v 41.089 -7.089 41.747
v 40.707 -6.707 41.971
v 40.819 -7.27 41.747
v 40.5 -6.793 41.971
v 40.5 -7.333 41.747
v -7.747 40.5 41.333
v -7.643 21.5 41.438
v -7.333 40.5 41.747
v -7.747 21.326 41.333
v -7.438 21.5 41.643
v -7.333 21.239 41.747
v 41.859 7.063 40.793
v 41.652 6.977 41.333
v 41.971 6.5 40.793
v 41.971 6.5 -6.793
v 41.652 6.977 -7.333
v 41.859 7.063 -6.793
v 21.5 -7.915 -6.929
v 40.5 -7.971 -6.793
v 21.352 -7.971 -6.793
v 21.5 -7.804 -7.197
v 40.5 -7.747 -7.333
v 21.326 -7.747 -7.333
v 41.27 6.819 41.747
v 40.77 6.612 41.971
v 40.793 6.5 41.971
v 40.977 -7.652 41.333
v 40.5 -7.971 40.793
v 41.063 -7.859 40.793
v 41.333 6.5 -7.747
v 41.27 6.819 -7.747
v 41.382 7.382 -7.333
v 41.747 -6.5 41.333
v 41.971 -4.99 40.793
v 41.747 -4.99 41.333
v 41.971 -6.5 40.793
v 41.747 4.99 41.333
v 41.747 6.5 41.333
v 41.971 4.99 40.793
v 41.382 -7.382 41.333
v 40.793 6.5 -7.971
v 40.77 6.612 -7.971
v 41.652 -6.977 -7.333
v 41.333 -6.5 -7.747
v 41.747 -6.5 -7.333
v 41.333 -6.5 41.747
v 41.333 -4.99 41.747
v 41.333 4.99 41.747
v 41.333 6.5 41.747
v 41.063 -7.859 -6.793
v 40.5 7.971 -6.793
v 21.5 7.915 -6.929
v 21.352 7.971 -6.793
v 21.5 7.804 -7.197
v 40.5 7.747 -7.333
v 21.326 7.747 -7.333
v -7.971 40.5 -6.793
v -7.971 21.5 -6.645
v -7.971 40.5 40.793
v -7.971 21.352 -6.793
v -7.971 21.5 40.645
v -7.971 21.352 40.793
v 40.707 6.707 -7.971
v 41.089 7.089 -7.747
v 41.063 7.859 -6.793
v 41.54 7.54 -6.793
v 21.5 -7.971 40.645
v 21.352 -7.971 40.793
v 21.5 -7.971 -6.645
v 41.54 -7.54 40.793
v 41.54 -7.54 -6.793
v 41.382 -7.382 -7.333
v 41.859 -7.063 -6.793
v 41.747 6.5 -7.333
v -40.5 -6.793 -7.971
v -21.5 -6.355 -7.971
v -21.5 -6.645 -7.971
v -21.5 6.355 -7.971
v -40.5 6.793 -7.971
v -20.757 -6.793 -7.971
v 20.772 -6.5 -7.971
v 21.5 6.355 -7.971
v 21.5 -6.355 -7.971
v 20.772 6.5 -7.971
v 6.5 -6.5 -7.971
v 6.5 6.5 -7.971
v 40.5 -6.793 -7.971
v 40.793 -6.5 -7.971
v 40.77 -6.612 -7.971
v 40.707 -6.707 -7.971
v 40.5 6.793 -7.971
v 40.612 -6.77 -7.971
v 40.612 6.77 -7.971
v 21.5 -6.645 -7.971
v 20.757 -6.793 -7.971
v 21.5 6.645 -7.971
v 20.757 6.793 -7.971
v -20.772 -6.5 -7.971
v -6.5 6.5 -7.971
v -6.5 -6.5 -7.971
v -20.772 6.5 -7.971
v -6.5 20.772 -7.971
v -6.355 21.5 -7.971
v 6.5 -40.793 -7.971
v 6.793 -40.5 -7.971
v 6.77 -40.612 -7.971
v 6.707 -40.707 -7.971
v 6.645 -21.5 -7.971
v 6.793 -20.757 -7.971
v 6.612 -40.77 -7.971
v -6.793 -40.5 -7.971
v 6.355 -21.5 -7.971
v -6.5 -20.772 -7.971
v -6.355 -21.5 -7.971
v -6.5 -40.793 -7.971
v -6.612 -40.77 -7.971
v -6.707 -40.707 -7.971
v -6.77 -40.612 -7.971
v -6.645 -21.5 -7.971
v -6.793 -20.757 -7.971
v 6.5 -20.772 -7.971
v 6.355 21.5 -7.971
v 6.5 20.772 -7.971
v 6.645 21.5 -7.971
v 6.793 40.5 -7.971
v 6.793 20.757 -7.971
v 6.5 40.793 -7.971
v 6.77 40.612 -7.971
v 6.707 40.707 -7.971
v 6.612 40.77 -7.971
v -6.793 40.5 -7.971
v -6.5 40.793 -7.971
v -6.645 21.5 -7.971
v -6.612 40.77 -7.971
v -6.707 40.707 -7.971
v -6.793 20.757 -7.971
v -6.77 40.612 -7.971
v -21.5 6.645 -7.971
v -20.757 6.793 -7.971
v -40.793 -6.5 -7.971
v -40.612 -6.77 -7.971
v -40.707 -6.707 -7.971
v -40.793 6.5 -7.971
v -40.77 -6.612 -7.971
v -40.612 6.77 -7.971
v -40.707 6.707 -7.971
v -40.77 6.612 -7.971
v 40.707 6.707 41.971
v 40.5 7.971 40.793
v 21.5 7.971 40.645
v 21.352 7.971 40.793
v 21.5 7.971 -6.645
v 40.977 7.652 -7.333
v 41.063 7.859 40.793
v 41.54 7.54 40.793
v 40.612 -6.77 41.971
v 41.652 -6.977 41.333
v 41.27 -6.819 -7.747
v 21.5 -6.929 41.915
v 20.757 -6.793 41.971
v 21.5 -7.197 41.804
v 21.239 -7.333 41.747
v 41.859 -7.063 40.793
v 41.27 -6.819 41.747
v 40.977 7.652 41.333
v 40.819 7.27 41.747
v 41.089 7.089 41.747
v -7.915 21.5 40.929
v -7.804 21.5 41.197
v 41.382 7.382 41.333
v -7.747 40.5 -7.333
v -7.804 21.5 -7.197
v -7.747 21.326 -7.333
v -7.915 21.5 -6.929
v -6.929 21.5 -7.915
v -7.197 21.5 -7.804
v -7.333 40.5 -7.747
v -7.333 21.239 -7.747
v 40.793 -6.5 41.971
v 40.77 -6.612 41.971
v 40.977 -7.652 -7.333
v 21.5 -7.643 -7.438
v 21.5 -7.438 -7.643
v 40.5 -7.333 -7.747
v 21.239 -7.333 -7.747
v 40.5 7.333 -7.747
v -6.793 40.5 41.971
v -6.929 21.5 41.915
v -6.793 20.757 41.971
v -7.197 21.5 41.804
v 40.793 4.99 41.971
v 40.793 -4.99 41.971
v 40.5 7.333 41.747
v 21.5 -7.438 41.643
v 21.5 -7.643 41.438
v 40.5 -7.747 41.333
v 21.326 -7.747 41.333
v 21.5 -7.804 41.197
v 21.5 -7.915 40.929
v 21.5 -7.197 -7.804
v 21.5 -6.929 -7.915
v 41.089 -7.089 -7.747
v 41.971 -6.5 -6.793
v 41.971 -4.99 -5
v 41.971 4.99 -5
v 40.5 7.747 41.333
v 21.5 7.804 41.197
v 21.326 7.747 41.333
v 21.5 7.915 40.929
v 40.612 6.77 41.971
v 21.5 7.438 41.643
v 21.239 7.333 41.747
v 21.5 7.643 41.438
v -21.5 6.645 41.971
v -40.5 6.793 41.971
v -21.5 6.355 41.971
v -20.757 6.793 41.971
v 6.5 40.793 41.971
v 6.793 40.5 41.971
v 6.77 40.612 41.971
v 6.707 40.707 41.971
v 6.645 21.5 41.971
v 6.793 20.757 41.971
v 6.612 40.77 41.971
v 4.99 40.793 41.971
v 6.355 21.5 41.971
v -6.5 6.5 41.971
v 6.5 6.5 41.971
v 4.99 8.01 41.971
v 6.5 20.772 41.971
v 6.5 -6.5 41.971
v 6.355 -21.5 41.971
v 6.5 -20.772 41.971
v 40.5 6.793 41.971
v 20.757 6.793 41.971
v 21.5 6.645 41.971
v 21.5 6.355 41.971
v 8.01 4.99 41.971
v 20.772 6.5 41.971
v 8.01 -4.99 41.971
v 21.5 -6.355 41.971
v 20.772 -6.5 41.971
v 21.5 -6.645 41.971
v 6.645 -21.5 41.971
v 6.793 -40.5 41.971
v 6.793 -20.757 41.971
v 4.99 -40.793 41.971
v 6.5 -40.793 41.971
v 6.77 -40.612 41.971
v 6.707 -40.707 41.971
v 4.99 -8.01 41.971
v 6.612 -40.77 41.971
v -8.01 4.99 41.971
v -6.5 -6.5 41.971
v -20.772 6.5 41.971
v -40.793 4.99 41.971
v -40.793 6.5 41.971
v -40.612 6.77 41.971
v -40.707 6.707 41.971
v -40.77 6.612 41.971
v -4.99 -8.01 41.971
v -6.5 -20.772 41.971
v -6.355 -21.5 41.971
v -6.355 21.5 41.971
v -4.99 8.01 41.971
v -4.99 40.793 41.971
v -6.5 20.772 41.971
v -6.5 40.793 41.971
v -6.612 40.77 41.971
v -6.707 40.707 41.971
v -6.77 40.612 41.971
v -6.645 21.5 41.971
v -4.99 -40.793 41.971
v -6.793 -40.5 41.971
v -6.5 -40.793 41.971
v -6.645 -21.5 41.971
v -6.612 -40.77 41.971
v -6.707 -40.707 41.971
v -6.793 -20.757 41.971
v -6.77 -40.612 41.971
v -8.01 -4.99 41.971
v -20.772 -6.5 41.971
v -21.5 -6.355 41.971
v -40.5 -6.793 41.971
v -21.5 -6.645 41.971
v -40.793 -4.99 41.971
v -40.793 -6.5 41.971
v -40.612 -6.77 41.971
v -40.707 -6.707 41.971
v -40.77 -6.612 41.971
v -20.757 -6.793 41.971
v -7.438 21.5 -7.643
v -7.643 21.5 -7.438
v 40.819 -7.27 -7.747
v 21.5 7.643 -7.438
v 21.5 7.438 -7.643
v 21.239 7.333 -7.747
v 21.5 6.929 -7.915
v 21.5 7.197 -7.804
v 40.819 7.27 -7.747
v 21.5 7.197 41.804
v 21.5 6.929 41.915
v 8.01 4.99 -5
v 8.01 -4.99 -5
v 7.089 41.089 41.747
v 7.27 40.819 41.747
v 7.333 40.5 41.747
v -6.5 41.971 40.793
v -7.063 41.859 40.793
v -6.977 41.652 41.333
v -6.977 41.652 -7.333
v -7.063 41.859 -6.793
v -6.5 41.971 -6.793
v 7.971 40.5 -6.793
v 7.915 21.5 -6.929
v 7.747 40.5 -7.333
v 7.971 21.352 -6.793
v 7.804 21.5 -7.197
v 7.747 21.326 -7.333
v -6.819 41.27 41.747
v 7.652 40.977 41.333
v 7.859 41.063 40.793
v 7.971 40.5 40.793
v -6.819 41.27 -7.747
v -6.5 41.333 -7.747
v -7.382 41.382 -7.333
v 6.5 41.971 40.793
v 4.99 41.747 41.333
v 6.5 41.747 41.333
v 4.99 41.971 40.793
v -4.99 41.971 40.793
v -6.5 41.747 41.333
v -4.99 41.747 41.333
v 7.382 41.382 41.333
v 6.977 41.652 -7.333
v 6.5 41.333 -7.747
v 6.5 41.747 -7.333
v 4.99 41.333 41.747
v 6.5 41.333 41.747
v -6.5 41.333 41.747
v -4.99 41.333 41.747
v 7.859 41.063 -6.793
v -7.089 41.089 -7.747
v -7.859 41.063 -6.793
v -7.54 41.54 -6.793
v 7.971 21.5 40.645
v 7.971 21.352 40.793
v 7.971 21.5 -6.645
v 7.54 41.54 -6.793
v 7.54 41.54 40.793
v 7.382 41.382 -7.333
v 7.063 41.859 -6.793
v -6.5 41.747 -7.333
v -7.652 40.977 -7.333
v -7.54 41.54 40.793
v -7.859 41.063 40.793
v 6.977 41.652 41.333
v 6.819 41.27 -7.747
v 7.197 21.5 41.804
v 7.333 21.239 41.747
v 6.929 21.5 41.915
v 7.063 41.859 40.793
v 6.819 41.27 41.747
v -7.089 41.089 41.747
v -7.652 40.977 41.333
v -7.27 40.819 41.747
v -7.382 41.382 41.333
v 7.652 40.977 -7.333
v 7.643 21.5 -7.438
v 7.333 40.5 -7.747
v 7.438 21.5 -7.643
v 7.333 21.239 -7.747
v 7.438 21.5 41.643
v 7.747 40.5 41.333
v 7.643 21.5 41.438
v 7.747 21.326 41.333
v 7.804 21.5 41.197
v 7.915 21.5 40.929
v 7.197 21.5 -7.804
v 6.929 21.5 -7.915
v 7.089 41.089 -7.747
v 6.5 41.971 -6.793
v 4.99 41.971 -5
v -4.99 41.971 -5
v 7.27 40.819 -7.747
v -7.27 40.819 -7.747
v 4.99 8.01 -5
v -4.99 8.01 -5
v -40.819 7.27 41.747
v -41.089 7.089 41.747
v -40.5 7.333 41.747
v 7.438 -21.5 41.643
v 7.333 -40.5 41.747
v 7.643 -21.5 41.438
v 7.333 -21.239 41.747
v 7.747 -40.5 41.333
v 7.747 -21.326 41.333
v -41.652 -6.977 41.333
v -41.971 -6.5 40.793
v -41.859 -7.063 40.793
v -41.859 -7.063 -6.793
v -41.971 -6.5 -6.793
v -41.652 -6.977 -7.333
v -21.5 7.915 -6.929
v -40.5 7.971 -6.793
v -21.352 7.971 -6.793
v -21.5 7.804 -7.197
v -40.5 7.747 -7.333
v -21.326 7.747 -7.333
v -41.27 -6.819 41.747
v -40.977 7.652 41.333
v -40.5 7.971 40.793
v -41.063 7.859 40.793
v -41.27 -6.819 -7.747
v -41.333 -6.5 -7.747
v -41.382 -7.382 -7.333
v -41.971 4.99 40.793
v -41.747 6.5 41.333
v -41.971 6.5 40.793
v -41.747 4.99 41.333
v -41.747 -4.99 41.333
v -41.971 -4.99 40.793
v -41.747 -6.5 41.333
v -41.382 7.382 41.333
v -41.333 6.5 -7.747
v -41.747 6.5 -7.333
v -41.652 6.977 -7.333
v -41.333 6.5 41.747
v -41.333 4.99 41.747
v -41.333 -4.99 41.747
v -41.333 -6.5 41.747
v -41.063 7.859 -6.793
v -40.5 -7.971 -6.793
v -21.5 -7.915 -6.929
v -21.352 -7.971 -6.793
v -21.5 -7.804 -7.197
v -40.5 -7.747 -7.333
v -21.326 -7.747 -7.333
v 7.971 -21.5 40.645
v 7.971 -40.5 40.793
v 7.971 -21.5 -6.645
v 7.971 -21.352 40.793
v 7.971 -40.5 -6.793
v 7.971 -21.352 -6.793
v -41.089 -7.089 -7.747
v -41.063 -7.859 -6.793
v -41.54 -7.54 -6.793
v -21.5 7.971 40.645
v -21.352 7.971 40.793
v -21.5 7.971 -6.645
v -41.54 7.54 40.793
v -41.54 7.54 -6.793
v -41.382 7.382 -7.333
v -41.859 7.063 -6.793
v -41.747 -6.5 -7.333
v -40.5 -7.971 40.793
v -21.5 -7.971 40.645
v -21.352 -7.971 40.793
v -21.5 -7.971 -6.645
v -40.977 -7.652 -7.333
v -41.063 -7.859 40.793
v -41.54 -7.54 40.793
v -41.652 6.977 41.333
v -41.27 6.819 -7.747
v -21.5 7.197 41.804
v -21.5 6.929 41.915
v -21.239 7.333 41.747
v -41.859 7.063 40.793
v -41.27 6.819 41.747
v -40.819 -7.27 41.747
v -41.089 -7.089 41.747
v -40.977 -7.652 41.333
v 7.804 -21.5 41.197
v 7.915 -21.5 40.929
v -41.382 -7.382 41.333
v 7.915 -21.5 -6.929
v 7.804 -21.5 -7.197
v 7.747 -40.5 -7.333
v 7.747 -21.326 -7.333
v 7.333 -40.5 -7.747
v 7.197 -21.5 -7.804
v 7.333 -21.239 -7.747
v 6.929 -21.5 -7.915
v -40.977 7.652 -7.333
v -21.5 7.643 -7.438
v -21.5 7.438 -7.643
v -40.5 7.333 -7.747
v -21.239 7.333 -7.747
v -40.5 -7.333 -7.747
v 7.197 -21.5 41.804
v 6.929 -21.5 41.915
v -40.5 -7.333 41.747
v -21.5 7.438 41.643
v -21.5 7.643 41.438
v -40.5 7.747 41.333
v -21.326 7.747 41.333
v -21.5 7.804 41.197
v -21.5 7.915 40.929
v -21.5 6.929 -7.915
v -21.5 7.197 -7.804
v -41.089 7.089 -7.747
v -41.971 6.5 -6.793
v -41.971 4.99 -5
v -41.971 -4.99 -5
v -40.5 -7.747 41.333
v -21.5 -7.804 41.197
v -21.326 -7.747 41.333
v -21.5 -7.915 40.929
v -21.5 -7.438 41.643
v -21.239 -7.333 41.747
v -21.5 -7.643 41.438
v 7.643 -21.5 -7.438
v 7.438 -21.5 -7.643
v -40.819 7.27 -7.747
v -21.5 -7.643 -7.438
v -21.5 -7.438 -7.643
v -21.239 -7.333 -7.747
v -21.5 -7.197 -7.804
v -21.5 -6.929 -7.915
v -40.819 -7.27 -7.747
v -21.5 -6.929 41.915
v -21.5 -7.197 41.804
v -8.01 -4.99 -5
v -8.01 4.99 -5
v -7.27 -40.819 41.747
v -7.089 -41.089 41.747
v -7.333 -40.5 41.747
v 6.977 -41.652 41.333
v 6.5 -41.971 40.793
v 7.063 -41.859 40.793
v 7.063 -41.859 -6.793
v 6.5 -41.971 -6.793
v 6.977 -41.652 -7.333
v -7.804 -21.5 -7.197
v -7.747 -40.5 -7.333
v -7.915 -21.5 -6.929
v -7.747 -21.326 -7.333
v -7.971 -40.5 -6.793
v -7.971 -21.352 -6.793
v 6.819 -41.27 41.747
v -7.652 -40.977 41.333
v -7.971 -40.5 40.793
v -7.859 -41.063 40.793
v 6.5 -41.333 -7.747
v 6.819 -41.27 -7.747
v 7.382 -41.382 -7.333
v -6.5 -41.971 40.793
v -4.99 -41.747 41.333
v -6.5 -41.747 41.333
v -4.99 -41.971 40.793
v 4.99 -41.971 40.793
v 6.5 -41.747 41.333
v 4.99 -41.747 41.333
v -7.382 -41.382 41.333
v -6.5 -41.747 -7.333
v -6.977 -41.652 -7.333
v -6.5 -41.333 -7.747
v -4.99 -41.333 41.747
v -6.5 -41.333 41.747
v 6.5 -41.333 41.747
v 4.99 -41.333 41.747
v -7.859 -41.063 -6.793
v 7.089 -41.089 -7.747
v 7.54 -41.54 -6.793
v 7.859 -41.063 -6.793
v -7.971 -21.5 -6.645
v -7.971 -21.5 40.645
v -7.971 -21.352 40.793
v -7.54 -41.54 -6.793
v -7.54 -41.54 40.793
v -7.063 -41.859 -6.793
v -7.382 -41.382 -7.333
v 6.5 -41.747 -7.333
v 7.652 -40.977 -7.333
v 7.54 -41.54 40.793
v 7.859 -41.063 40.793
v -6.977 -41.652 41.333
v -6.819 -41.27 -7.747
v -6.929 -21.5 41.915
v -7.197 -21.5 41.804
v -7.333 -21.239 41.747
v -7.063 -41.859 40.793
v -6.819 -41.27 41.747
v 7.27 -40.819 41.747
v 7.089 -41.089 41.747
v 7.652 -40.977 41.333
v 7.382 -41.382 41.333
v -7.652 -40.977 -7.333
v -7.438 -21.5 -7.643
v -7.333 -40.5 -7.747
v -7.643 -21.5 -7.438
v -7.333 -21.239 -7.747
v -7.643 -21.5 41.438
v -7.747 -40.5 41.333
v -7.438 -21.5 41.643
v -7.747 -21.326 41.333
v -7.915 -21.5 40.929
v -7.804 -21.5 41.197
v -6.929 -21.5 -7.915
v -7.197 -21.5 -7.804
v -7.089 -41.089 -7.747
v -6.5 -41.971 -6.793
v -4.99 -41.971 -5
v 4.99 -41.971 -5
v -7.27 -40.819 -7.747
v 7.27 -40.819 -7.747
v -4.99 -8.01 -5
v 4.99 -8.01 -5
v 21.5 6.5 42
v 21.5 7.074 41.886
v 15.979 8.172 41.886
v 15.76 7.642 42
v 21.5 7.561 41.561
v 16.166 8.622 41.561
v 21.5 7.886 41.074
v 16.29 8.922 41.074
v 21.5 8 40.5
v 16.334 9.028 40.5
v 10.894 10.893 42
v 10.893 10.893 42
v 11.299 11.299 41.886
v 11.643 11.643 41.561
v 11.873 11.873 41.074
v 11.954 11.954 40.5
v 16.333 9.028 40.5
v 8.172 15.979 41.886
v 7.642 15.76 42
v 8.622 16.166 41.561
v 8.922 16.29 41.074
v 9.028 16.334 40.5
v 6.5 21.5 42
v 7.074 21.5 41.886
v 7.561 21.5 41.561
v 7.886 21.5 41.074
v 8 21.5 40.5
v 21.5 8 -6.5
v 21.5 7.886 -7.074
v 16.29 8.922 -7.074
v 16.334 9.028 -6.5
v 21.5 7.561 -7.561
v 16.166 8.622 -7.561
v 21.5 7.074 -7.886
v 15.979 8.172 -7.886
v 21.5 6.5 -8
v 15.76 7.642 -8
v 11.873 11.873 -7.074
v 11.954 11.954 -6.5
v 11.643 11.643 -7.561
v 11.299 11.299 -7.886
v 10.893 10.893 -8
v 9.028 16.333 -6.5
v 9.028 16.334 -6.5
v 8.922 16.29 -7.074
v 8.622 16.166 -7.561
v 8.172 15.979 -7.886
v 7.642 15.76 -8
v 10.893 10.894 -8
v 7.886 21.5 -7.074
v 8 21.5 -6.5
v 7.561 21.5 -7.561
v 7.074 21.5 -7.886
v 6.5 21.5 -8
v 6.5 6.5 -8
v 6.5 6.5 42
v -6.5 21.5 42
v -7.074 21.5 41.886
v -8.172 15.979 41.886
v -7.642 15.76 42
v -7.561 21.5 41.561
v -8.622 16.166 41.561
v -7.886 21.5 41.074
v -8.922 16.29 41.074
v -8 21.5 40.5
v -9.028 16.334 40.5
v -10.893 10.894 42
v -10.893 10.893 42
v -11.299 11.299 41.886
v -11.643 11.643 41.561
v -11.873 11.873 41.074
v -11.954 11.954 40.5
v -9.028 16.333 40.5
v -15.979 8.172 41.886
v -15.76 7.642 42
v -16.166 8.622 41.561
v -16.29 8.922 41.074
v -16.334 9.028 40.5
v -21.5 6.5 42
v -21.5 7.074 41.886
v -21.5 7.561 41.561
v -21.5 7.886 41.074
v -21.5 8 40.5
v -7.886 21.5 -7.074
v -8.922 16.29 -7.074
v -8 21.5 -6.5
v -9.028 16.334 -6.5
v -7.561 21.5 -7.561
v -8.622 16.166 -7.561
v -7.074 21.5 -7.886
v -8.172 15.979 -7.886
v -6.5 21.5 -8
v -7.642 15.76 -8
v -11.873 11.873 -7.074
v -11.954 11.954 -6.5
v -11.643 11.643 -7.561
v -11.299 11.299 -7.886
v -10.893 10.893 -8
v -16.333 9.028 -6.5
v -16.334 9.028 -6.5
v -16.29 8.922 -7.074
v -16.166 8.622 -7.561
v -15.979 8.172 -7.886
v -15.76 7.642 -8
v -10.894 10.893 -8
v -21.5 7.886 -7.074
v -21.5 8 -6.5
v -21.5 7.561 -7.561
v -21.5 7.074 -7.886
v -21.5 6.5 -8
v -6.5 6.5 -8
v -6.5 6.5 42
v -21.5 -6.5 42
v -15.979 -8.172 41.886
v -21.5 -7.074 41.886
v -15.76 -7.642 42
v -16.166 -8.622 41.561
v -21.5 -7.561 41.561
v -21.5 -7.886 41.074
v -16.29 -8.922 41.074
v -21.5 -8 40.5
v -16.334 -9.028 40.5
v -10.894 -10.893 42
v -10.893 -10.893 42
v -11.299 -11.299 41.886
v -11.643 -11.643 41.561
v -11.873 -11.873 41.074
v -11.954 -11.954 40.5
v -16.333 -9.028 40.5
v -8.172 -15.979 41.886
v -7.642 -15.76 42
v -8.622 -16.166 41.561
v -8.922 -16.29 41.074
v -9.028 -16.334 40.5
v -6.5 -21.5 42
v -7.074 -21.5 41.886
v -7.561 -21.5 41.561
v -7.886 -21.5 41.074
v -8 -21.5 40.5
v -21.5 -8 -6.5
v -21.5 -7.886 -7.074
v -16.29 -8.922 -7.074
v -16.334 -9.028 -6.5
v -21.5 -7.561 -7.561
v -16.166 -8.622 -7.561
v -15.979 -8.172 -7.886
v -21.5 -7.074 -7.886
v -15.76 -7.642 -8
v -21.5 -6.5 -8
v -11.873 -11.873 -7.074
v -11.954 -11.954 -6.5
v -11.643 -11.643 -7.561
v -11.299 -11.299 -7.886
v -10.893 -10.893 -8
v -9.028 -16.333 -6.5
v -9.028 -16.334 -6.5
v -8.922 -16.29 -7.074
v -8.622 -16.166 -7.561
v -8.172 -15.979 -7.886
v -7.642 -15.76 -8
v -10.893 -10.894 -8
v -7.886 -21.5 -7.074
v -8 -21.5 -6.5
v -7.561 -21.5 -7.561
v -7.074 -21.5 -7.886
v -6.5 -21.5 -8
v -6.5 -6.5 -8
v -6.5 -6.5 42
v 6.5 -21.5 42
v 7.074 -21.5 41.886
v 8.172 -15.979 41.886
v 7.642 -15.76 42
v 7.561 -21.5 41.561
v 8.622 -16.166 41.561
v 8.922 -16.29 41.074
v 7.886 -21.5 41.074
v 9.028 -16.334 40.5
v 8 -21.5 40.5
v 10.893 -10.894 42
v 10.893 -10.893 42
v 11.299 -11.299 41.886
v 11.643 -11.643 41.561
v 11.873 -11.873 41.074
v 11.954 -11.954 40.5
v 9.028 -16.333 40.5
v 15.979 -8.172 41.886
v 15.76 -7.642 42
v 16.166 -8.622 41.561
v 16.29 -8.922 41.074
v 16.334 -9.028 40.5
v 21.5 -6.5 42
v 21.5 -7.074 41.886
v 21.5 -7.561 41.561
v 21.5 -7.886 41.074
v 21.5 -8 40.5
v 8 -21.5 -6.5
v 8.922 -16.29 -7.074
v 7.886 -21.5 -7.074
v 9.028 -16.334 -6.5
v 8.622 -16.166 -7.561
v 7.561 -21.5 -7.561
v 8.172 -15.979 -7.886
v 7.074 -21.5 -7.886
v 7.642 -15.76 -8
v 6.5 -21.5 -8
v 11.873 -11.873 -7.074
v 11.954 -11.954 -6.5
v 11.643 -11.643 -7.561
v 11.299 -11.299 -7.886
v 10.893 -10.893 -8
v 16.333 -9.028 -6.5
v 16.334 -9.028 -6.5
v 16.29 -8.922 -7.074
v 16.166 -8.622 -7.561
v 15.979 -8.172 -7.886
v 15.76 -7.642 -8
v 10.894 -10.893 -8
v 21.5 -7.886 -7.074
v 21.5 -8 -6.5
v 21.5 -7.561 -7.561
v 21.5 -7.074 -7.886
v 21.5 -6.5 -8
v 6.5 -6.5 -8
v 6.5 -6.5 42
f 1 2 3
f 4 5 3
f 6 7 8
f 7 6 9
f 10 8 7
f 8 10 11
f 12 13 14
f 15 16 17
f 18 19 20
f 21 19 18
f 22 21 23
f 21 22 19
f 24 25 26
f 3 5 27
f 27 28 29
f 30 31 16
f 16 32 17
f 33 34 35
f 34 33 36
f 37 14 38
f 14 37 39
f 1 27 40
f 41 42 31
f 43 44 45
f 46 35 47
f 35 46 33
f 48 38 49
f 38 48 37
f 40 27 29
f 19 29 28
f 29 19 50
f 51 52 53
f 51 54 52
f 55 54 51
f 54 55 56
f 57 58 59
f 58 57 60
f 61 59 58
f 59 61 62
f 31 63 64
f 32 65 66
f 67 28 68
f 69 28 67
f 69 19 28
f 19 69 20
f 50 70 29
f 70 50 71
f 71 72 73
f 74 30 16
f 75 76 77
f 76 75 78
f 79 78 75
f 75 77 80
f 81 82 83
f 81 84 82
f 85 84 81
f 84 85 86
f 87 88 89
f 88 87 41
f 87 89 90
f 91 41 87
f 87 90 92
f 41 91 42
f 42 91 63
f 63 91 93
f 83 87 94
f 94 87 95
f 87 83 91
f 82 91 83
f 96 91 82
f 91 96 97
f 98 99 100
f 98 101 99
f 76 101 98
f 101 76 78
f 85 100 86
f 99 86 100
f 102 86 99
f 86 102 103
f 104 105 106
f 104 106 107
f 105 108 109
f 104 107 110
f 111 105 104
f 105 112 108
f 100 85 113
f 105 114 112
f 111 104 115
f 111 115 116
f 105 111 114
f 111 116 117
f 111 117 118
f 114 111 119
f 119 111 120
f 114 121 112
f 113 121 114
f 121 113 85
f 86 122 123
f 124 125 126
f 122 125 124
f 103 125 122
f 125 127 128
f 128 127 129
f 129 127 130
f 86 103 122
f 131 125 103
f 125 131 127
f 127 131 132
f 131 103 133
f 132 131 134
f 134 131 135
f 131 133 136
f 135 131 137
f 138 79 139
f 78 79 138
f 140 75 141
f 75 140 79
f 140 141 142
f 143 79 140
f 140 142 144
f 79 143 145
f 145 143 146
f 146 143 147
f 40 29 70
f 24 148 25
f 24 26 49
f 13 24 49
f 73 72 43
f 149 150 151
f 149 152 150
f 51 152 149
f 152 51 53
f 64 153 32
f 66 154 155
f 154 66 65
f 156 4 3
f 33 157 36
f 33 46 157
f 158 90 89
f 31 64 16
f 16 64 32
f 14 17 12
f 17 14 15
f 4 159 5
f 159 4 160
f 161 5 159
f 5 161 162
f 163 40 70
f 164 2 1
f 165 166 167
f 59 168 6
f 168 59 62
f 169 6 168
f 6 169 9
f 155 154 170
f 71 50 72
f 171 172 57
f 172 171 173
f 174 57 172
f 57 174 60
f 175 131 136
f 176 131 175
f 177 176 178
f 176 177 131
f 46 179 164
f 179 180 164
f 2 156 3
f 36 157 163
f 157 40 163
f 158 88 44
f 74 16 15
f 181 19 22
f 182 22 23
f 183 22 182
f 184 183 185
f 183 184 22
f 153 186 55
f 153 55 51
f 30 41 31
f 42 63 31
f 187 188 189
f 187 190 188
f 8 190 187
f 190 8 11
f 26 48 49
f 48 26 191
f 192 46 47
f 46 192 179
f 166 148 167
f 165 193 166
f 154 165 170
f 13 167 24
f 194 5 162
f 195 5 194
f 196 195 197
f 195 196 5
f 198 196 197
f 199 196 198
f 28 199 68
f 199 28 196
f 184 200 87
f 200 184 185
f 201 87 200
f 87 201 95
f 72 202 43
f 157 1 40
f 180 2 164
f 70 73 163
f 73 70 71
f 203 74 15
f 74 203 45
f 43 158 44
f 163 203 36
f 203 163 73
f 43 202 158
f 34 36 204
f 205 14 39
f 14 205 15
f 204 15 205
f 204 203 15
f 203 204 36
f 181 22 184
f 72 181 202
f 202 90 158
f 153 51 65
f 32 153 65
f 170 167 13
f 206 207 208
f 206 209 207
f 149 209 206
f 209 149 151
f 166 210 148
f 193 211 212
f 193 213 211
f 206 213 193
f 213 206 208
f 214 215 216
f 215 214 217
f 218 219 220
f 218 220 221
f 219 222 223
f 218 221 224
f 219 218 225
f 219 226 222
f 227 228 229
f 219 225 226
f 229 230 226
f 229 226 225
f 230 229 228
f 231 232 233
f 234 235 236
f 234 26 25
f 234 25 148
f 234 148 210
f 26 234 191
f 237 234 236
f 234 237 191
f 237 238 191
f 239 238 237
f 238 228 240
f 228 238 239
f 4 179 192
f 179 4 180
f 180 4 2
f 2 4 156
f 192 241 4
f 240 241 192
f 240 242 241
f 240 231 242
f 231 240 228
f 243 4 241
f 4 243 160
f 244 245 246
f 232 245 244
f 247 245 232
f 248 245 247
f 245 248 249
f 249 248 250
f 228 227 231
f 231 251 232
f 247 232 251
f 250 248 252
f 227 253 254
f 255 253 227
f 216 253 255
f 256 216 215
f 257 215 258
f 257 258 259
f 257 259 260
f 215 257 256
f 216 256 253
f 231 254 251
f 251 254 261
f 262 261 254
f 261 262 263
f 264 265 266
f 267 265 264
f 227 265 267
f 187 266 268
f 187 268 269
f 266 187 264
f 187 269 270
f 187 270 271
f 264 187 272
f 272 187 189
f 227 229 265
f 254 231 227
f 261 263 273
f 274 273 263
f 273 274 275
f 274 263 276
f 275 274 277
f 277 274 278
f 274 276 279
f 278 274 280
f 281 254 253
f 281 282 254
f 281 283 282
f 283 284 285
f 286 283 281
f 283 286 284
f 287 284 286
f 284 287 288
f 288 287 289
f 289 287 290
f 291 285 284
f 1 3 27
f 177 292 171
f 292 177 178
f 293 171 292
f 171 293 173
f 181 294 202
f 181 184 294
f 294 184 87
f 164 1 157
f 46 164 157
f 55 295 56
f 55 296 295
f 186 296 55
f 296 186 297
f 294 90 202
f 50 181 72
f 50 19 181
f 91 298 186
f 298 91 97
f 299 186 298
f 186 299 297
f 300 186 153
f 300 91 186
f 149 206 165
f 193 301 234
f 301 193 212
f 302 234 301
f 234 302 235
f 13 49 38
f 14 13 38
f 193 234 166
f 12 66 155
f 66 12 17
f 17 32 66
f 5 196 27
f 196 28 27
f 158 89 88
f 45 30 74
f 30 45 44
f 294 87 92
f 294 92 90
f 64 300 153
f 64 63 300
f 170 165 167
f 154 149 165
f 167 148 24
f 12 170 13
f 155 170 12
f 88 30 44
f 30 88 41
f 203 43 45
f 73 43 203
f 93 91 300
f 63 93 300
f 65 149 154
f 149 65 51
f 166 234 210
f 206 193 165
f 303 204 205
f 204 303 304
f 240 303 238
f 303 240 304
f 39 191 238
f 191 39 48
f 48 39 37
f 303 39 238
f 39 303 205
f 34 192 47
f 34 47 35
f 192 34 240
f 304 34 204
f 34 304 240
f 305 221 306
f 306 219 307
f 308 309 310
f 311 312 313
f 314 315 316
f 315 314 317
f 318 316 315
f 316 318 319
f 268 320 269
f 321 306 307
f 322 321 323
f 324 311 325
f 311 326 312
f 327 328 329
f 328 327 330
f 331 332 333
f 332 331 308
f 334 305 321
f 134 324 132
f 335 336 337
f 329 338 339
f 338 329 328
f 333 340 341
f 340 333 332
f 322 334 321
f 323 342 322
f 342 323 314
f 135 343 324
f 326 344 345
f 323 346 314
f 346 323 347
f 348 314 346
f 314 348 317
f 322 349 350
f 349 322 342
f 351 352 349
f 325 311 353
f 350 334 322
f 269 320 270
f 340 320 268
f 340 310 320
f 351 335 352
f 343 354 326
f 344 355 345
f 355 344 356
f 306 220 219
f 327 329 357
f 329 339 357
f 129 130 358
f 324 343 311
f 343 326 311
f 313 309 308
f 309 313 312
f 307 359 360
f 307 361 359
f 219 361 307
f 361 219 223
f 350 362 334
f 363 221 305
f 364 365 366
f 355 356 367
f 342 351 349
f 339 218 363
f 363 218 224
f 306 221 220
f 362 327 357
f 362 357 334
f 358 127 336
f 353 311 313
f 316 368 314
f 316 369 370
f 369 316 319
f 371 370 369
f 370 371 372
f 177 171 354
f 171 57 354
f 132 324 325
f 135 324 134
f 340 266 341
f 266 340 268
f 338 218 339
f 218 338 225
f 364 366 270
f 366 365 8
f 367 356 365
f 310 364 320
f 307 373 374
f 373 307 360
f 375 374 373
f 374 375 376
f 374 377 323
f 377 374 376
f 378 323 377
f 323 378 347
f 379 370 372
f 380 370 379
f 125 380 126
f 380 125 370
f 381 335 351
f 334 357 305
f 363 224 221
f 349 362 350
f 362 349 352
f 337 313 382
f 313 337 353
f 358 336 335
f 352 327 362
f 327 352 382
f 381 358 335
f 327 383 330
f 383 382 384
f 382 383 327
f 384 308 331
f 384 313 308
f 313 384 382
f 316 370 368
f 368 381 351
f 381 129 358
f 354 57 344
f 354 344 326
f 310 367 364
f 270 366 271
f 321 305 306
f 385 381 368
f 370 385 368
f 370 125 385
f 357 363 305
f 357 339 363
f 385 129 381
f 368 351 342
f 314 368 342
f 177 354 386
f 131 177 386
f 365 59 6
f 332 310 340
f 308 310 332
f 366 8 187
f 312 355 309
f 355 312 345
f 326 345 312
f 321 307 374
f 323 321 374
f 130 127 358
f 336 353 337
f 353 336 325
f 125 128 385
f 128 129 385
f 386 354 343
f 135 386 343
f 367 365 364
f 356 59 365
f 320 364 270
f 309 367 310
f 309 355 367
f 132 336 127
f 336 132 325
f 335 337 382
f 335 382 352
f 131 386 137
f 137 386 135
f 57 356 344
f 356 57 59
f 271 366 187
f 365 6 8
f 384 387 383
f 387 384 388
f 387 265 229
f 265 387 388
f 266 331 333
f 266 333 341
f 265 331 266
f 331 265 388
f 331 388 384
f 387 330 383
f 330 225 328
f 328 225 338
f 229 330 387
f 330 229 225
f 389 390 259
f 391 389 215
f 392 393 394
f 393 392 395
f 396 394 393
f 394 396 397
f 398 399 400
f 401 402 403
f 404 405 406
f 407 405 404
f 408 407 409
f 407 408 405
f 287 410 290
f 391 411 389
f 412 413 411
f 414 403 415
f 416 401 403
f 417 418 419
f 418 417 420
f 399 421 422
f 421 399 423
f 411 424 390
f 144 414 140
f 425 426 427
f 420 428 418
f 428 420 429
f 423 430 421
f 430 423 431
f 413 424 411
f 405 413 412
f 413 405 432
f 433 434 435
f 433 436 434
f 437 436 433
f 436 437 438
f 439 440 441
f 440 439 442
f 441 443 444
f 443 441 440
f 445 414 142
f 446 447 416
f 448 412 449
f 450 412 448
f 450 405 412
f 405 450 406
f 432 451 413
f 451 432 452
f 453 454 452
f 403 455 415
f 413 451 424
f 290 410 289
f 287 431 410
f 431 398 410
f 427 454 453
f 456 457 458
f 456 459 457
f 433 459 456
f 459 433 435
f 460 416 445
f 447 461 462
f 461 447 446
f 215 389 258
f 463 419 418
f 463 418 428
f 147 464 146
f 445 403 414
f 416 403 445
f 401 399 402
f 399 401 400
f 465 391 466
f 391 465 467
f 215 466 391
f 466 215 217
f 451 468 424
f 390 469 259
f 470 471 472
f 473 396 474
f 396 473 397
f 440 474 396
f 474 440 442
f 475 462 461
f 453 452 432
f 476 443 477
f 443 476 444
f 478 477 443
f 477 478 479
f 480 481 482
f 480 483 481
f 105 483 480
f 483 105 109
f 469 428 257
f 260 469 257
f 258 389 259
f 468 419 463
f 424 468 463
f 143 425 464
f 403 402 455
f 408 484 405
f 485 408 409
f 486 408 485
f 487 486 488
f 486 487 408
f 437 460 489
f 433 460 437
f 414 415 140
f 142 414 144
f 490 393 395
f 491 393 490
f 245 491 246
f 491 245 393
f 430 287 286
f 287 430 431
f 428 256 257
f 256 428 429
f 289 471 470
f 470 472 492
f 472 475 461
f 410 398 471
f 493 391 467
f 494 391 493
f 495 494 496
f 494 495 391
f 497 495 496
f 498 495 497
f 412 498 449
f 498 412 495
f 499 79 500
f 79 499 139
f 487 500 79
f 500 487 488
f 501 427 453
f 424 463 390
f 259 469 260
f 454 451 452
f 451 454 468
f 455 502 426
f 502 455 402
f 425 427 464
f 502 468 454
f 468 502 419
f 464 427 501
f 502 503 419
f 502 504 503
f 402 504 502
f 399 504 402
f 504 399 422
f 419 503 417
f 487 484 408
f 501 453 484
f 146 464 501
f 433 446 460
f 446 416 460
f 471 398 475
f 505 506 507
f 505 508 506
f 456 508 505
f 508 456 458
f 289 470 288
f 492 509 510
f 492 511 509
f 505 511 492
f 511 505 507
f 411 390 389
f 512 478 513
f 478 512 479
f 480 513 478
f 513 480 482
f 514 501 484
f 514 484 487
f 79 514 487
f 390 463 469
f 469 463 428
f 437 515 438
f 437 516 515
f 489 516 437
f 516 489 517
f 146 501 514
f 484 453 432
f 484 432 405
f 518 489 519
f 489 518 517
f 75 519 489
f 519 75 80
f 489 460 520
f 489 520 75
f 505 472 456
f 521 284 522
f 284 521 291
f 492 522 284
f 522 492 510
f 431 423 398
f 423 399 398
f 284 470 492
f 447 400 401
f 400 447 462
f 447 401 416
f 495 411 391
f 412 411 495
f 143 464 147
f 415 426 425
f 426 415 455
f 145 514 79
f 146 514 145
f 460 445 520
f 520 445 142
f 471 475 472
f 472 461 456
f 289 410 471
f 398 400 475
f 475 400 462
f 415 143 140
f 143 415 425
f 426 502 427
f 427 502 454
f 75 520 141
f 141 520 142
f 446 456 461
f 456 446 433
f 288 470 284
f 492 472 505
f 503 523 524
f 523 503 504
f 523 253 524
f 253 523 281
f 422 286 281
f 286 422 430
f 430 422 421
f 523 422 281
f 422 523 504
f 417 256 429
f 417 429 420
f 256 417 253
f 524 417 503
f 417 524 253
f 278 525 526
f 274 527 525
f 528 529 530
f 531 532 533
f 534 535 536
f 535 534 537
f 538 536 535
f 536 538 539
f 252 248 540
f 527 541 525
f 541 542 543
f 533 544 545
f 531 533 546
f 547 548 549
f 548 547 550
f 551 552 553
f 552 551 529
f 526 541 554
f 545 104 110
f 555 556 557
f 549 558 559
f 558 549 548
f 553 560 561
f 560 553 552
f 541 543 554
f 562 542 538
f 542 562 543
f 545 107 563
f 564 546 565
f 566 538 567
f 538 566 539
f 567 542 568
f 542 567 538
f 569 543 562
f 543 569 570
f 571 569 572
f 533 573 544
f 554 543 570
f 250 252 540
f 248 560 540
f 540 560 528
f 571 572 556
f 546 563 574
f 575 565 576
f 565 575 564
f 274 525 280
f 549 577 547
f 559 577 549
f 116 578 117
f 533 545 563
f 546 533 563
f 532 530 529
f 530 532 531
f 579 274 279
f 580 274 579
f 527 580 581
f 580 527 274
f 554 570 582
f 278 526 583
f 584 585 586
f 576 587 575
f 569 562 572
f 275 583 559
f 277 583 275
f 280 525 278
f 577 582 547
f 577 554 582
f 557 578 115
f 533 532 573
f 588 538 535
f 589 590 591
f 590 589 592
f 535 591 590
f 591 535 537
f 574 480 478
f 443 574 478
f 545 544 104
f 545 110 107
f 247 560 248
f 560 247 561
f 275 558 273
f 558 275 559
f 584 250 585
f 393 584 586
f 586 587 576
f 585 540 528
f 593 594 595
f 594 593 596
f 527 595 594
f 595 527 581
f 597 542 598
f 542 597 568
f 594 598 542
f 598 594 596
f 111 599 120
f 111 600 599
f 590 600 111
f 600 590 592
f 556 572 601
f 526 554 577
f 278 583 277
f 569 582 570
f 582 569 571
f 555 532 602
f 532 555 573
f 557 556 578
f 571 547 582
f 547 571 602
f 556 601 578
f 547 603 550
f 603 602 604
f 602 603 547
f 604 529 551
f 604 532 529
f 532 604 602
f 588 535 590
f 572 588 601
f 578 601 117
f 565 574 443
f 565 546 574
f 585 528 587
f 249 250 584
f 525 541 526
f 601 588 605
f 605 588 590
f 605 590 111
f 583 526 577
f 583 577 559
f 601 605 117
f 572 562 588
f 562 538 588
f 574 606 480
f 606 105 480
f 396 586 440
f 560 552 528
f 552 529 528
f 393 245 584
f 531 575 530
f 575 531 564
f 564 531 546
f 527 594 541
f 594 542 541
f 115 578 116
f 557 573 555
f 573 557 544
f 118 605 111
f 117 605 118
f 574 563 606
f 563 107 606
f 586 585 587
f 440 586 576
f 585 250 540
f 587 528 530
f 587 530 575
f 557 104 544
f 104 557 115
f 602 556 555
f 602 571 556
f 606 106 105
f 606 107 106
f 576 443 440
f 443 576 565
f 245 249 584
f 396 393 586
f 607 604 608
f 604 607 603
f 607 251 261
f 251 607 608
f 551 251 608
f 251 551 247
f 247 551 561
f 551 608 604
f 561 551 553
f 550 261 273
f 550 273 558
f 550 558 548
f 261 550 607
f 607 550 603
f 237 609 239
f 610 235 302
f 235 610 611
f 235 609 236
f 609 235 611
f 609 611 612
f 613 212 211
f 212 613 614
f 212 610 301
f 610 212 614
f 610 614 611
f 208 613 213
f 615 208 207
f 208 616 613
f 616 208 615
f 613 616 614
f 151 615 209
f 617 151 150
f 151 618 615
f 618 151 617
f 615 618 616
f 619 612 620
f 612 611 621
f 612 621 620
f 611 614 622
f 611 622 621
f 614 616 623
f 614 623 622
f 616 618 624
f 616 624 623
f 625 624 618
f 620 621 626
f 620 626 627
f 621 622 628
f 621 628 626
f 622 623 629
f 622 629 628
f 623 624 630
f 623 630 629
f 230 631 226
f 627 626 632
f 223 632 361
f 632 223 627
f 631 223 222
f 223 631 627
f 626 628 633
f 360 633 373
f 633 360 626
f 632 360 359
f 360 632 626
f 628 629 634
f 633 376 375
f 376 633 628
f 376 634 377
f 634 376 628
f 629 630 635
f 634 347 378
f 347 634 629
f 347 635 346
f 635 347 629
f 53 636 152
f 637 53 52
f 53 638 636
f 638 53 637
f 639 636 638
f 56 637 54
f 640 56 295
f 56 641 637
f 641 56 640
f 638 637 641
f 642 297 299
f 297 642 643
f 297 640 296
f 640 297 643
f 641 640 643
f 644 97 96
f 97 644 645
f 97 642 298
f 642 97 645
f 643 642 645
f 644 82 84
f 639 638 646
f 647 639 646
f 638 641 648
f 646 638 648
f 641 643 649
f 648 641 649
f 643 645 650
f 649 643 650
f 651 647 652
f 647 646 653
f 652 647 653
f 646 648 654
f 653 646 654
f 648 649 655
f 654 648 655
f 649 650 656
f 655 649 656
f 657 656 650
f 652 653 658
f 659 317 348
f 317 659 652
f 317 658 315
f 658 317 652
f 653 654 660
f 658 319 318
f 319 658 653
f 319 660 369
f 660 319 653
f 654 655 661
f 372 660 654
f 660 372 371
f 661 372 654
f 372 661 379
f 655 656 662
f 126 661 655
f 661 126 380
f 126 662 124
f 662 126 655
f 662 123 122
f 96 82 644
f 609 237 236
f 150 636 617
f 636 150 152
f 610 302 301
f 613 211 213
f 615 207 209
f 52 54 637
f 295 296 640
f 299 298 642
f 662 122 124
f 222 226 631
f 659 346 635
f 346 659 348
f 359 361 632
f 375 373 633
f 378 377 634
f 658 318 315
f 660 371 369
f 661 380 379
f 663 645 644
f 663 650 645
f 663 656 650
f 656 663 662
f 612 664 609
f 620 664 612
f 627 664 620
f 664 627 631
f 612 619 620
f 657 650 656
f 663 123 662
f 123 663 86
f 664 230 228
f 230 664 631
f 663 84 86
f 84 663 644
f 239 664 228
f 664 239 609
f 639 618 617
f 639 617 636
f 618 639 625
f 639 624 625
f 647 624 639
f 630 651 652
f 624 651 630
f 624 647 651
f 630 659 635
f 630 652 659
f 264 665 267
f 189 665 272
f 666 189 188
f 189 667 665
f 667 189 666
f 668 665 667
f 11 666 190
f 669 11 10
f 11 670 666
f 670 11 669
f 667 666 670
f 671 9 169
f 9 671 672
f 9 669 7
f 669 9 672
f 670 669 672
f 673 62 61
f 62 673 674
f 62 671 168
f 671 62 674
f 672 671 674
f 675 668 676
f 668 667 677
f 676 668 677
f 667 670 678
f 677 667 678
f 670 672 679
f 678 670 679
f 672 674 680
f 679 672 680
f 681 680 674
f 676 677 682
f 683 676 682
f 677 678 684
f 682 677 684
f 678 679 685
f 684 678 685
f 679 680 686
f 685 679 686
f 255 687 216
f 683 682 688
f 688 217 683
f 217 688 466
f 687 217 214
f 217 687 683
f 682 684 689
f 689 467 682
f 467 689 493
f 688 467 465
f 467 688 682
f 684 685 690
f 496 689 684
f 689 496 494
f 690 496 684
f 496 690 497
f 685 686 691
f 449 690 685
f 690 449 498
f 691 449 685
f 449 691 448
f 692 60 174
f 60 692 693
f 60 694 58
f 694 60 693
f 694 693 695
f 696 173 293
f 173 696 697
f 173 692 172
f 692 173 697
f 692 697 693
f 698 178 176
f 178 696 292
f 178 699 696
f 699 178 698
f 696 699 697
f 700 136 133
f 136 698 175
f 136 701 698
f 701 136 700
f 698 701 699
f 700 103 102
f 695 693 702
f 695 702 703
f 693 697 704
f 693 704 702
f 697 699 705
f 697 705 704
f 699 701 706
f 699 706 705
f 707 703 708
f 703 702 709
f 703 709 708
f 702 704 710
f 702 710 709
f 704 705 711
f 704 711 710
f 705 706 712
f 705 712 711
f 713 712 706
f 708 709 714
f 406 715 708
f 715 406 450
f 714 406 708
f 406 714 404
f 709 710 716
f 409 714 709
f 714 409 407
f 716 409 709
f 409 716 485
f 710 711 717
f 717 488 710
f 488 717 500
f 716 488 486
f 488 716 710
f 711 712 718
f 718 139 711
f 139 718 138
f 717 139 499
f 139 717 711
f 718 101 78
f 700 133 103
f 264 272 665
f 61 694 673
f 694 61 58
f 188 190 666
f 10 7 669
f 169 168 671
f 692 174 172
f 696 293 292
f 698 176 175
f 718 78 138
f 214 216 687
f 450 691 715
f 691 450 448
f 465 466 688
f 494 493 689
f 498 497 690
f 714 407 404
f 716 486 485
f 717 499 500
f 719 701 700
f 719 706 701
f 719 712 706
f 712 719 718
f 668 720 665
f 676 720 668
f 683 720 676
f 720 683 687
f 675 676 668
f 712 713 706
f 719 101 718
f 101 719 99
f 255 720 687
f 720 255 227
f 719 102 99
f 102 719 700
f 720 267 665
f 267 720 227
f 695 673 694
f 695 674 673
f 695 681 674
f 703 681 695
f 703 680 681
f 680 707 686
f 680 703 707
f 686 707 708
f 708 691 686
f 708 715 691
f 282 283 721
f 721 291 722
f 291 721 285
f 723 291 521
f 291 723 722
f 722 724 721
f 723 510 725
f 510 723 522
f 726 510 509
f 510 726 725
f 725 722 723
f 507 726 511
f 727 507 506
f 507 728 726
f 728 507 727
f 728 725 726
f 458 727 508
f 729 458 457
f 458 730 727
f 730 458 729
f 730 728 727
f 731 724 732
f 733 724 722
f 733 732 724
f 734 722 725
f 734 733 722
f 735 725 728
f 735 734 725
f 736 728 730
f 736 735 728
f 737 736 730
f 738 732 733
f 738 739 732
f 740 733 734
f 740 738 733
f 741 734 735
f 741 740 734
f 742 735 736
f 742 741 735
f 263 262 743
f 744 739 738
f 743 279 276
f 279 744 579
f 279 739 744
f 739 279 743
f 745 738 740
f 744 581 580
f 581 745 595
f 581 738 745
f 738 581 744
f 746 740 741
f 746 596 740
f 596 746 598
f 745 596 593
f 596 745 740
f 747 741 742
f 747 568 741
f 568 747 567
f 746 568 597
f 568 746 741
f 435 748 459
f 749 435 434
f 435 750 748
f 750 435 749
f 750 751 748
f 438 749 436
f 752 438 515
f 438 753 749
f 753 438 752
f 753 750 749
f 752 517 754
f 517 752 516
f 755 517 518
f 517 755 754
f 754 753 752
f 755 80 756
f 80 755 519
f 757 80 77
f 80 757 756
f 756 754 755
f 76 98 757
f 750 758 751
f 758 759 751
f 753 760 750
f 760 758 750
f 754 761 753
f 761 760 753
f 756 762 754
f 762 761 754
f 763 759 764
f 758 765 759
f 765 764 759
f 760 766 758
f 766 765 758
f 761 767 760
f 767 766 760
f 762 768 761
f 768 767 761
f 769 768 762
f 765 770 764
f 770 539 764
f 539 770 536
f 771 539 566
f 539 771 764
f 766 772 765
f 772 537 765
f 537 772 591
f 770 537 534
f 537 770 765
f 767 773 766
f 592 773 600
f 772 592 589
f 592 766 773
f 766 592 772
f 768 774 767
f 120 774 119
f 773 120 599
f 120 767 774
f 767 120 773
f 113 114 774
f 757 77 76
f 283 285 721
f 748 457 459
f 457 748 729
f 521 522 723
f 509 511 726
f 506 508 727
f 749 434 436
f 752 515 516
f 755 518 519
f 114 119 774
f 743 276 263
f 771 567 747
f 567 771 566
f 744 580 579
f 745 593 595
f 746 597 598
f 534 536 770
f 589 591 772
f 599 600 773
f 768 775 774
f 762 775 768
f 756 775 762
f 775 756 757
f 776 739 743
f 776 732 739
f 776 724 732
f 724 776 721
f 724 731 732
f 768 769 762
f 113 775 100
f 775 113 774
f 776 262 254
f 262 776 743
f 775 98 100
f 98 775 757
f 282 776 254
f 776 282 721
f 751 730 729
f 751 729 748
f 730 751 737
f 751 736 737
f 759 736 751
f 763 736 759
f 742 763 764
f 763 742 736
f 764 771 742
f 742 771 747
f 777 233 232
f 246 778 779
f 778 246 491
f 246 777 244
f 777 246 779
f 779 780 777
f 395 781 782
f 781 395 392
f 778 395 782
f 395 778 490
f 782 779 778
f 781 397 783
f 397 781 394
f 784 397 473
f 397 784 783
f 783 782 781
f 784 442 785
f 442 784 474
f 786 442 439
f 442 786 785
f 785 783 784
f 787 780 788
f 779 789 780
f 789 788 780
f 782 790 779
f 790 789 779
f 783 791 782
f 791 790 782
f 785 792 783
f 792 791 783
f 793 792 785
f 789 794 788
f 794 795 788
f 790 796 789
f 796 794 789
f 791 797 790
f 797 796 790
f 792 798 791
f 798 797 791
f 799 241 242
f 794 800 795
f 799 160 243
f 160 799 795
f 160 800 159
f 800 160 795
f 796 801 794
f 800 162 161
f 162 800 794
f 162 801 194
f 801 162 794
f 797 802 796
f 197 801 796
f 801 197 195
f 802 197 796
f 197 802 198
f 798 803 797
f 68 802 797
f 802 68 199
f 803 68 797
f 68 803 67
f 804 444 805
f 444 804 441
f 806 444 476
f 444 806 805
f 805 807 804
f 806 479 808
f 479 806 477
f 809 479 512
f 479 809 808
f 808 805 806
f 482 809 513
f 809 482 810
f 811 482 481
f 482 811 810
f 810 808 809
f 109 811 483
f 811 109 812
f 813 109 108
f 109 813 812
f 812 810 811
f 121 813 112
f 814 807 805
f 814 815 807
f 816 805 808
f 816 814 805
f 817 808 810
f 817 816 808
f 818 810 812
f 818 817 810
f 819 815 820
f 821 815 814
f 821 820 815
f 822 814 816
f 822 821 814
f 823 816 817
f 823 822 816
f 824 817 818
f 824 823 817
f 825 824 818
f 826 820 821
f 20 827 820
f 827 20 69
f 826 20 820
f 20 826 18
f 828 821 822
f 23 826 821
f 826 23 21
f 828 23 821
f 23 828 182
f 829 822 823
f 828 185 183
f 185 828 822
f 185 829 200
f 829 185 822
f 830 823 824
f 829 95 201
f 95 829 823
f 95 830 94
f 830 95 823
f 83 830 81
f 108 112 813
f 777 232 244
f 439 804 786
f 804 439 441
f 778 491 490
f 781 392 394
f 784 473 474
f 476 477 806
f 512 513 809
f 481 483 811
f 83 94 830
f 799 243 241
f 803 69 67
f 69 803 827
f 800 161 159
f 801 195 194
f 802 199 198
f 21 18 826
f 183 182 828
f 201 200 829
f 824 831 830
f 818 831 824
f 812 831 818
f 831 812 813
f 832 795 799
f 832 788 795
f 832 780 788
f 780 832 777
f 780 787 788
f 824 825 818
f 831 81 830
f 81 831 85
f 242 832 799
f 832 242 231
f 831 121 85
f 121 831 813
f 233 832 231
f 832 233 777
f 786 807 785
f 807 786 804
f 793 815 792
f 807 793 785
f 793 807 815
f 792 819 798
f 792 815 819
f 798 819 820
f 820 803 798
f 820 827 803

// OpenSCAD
/* [Parameters] */

//
module_type = "X-module"; // [I-module, L-module, T-module, X-module, BL-module, BT-module, BR-module, FL-module, FT-module, FR-module]

//
module_width = 50;

//
board_thickness = 10;

//
wall_thickness = 3;

/* [Shape] */
//Open SCAD parameter $fn = 4*detalization. Do not put too big value customizer will stuck.
shape_detalization=4; // default = 15, i.e. $fn = 60

//
corner_radius = 15;

//corner shape type
shape_type = "no shape"; // [no shape, linear, circle, arc-in]

//
shape_parameter = 0;

HH = module_width;
RR = corner_radius;
DD = board_thickness;
r=wall_thickness/2;

PP = shape_parameter;
$fn = 4*shape_detalization;

module side_block(h,d,r) {
 LHH = h-d/2-3*r;
 LDD = d/2+r;
 eps=0.01;

 difference(){
  hull(){
   translate([-LDD,+LDD,-LDD])sphere(r=r,center=true);
   translate([-LDD,-LDD,-LDD])sphere(r=r,center=true);
   translate([LHH,+LDD,-LDD])sphere(r=r,center=true);
   translate([LHH,-LDD,-LDD])sphere(r=r,center=true);
   translate([-LDD,+LDD,LHH])sphere(r=r,center=true);
   translate([-LDD,-LDD,LHH])sphere(r=r,center=true);
   translate([LHH,+LDD,LHH])sphere(r=r,center=true);
   translate([LHH,-LDD,LHH])sphere(r=r,center=true);
  }
  translate([d/2+2*r+eps,-d/2+eps,-d/2])cube([h,d-2*eps,h]);
 }
}

module side_corner(h,d,q,r) {
 LHH = h-d/2-3*r;
 LDD = d/2+r;
 w=d+2*r;

 translate([0,0,-(d/2+r)]){
  translate([q+w/2,q+w/2,0])
  intersection(){
   rotate_extrude(convexity = 2){
    translate([q, 0]) circle(r = r); 
    translate([q, HH-2*r]) circle(r = r); 
   }
   translate([-q/2-r/2,-q/2-r/2,HH/2-r])
    cube([q+r,q+r,HH],center=true);
  }

  translate([0,0,-r])
  linear_extrude(HH)
  difference(){
   translate([w/2,w/2])square([q,q]);
   translate([+(q+w/2),+(q+w/2)])circle(q);
  }

  linear_extrude(HH-2*r)
  difference(){
   translate([w/2,w/2])square([q,q]);
   translate([+(q+w/2),+(q+w/2)])circle(q-r);
  }
 }
}

module side_plate_line(h,d,q,r){
 LHH = h-d/2-3*r;
 LDD = d/2+r;

 hull()
 {
  translate([LDD,LDD,-LDD])sphere(r=r,center=true);
  translate([LDD,LHH-q,-LDD])sphere(r=r,center=true);
  translate([LHH-q,LDD,-LDD])sphere(r=r,center=true);
 }
}

module side_plate_arcout(h,d,q,r){
 LHH = h-d/2-3*r;
 LDD = d/2+r;

 hull()
 {
  translate([LDD,LDD,-LDD])sphere(r=r,center=true);
  translate([LDD,LHH,-LDD])sphere(r=r,center=true);
  translate([LHH,LDD,-LDD])sphere(r=r,center=true);
  translate([0,0,-(d/2+r)])
  translate([LHH-q,LHH-q,0])
  intersection(){
   rotate_extrude(){
    translate([q, 0])
    intersection(){
     circle(r = r);
     translate([0,-r])square([2*r,2*r]);
    }
   }
   translate([+q/2+r/2,+q/2+r/2,h/2-r])
    cube([q+r,q+r,h],center=true);
  }
 }
}

module side_plate_arcin(h,d,q,r) {
 LHH = h-d/2-3*r;
 LDD = d/2+r;
 w=d+2*r;

 translate([0,0,-(d/2+r)]){
  translate([q+w/2,q+w/2,0])
  intersection(){
   rotate_extrude(convexity = 2){
    translate([q, 0]) circle(r = r); 
   }
   translate([-q/2-r/2,-q/2-r/2,HH/2-r])
    cube([q+r,q+r,HH],center=true);
  }

  translate([0,0,-r])
  linear_extrude(2*r)
  difference(){
   translate([w/2,w/2])square([q,q]);
   translate([+(q+w/2),+(q+w/2)])circle(q);
  }
 }
}

module side_plate(h,d,q,r){
 side_corner(h,d,q,r);
 if (shape_type == "linear") side_plate_line(h,d,PP,r);
 if (shape_type == "circle") side_plate_arcout(h,d,PP,r);
 if (shape_type == "arc-in") side_plate_arcin(h,d,h-d-4*r-PP,r);
}

module bottom_sub(h,d,q,r){
 w=d+2*r;
 translate([+(h-w/2),-w/2,0])
 scale([0.8,h/(h-w),1])  //1.5
 translate([0,h-w,0])
 cylinder(r=h-w,h=2*h,center=true,$fn=2*$fn);
}

module bottom_frame(h,d,q,r){
 LHH = h-d/2-3*r;
 LDD = d/2+r;
 w=d+2*r;
 ww = 2*h-w-2*(h-w)*0.8;

 rotate([0,0,180])
 minkowski()
 {
  difference(){
   translate([0,d/2+r,0])
    translate([-ww/2,0,-ww/2])
    cube([h-2*r,LHH-d/2-r,h-2*r]);
 
   union(){
    rotate([0,  0,0]) bottom_sub(h,d,q,r);
    rotate([0, 90,0]) bottom_sub(h,d,q,r);
    rotate([0,-90,0]) bottom_sub(h,d,q,r);
    rotate([0,180,0]) bottom_sub(h,d,q,r);
   }
  }
  sphere(r=r);
 }
}

module module_BL(h=HH,d=DD,q=RR,r=r){
 w=d+2*r;
 ww = 2*h-w-2*(h-w)*0.8;
 
 module_L(h,d,q,r);
 translate([(ww-w)/2,0,(ww-w)/2])
 rotate([0,90,0])bottom_frame(h,d,q,r);
}

module module_BR(h=HH,d=DD,q=RR,r=r){
 mirror([1,0,0])module_BL(h,d,q,r);
}

module module_BT(h=HH,d=DD,q=RR,r=r){
 w=d+2*r;
 ww = 2*h-w-2*(h-w)*0.8;
 
 rotate([0,0,180])module_T(h,d,q,r);
 translate([0,0,(ww-w)/2]){
 rotate([0,0,0])bottom_frame(h,d,q,r);
 rotate([0,90,0])bottom_frame(h,d,q,r);
 }
}

module module_FR(h=HH,d=DD,q=RR,r=r){
 w=d+2*r;
 ww = 2*h-w-2*(h-w)*0.8;
 
 module_L(h,d,q,r);
 //translate([(ww-w)/2,0,(ww-w)/2])
 translate([(ww-w)/2,0,h-w-2*r-(ww-w)/2])
 rotate([0,180,0])bottom_frame(h,d,q,r);
}

module module_FL(h=HH,d=DD,q=RR,r=r){
 mirror([1,0,0])module_FR(h,d,q,r);
}

module module_FT(h=HH,d=DD,q=RR,r=r){
 w=d+2*r;
 ww = 2*h-w-2*(h-w)*0.8;
 
 rotate([0,0,180])module_T(h,d,q,r);
 translate([0,0,h-w-2*r-(ww-w)/2]){
 rotate([0,180,0])bottom_frame(h,d,q,r);
 rotate([0,-90,0])bottom_frame(h,d,q,r);
 }
}

module module_I(h=HH,d=DD,q=RR,r=r){
 rotate([0,0,-90])side_block(h, d, r);
 rotate([0,0,+90])side_block(h, d, r);
}

module module_L(h=HH,d=DD,q=RR,r=r){
 side_block(h, d, r);
 rotate([0,0,90])side_block(h, d, r);

 side_plate(h,d,q,r);
}

module module_T(h=HH,d=DD,q=RR,r=r){
 rotate([0,0,0])side_block(h, d, r);
 rotate([0,0,-90])side_block(h, d, r);
 rotate([0,0,180])side_block(h, d, r);

 rotate([0,0,-90])side_plate(h,d,q,r);
 rotate([0,0,180])side_plate(h,d,q,r);
}

module module_X(h=HH,d=DD,q=RR,r=r){
 rotate([0,0,  0])side_block(h, d, r);
 rotate([0,0, 90])side_block(h, d, r);
 rotate([0,0,180])side_block(h, d, r);
 rotate([0,0,270])side_block(h, d, r);

 rotate([0,0,  0])side_plate(h,d,q,r);
 rotate([0,0, 90])side_plate(h,d,q,r);
 rotate([0,0,180])side_plate(h,d,q,r);
 rotate([0,0,270])side_plate(h,d,q,r);
}

if (module_type == "I-module") module_I();
if (module_type == "L-module") module_L();
if (module_type == "T-module") module_T();
if (module_type == "X-module") module_X();
if (module_type == "BL-module") module_BL();
if (module_type == "BT-module") module_BT();
if (module_type == "BR-module") module_BR();
if (module_type == "FL-module") module_FL();
if (module_type == "FT-module") module_FT();
if (module_type == "FR-module") module_FR();
